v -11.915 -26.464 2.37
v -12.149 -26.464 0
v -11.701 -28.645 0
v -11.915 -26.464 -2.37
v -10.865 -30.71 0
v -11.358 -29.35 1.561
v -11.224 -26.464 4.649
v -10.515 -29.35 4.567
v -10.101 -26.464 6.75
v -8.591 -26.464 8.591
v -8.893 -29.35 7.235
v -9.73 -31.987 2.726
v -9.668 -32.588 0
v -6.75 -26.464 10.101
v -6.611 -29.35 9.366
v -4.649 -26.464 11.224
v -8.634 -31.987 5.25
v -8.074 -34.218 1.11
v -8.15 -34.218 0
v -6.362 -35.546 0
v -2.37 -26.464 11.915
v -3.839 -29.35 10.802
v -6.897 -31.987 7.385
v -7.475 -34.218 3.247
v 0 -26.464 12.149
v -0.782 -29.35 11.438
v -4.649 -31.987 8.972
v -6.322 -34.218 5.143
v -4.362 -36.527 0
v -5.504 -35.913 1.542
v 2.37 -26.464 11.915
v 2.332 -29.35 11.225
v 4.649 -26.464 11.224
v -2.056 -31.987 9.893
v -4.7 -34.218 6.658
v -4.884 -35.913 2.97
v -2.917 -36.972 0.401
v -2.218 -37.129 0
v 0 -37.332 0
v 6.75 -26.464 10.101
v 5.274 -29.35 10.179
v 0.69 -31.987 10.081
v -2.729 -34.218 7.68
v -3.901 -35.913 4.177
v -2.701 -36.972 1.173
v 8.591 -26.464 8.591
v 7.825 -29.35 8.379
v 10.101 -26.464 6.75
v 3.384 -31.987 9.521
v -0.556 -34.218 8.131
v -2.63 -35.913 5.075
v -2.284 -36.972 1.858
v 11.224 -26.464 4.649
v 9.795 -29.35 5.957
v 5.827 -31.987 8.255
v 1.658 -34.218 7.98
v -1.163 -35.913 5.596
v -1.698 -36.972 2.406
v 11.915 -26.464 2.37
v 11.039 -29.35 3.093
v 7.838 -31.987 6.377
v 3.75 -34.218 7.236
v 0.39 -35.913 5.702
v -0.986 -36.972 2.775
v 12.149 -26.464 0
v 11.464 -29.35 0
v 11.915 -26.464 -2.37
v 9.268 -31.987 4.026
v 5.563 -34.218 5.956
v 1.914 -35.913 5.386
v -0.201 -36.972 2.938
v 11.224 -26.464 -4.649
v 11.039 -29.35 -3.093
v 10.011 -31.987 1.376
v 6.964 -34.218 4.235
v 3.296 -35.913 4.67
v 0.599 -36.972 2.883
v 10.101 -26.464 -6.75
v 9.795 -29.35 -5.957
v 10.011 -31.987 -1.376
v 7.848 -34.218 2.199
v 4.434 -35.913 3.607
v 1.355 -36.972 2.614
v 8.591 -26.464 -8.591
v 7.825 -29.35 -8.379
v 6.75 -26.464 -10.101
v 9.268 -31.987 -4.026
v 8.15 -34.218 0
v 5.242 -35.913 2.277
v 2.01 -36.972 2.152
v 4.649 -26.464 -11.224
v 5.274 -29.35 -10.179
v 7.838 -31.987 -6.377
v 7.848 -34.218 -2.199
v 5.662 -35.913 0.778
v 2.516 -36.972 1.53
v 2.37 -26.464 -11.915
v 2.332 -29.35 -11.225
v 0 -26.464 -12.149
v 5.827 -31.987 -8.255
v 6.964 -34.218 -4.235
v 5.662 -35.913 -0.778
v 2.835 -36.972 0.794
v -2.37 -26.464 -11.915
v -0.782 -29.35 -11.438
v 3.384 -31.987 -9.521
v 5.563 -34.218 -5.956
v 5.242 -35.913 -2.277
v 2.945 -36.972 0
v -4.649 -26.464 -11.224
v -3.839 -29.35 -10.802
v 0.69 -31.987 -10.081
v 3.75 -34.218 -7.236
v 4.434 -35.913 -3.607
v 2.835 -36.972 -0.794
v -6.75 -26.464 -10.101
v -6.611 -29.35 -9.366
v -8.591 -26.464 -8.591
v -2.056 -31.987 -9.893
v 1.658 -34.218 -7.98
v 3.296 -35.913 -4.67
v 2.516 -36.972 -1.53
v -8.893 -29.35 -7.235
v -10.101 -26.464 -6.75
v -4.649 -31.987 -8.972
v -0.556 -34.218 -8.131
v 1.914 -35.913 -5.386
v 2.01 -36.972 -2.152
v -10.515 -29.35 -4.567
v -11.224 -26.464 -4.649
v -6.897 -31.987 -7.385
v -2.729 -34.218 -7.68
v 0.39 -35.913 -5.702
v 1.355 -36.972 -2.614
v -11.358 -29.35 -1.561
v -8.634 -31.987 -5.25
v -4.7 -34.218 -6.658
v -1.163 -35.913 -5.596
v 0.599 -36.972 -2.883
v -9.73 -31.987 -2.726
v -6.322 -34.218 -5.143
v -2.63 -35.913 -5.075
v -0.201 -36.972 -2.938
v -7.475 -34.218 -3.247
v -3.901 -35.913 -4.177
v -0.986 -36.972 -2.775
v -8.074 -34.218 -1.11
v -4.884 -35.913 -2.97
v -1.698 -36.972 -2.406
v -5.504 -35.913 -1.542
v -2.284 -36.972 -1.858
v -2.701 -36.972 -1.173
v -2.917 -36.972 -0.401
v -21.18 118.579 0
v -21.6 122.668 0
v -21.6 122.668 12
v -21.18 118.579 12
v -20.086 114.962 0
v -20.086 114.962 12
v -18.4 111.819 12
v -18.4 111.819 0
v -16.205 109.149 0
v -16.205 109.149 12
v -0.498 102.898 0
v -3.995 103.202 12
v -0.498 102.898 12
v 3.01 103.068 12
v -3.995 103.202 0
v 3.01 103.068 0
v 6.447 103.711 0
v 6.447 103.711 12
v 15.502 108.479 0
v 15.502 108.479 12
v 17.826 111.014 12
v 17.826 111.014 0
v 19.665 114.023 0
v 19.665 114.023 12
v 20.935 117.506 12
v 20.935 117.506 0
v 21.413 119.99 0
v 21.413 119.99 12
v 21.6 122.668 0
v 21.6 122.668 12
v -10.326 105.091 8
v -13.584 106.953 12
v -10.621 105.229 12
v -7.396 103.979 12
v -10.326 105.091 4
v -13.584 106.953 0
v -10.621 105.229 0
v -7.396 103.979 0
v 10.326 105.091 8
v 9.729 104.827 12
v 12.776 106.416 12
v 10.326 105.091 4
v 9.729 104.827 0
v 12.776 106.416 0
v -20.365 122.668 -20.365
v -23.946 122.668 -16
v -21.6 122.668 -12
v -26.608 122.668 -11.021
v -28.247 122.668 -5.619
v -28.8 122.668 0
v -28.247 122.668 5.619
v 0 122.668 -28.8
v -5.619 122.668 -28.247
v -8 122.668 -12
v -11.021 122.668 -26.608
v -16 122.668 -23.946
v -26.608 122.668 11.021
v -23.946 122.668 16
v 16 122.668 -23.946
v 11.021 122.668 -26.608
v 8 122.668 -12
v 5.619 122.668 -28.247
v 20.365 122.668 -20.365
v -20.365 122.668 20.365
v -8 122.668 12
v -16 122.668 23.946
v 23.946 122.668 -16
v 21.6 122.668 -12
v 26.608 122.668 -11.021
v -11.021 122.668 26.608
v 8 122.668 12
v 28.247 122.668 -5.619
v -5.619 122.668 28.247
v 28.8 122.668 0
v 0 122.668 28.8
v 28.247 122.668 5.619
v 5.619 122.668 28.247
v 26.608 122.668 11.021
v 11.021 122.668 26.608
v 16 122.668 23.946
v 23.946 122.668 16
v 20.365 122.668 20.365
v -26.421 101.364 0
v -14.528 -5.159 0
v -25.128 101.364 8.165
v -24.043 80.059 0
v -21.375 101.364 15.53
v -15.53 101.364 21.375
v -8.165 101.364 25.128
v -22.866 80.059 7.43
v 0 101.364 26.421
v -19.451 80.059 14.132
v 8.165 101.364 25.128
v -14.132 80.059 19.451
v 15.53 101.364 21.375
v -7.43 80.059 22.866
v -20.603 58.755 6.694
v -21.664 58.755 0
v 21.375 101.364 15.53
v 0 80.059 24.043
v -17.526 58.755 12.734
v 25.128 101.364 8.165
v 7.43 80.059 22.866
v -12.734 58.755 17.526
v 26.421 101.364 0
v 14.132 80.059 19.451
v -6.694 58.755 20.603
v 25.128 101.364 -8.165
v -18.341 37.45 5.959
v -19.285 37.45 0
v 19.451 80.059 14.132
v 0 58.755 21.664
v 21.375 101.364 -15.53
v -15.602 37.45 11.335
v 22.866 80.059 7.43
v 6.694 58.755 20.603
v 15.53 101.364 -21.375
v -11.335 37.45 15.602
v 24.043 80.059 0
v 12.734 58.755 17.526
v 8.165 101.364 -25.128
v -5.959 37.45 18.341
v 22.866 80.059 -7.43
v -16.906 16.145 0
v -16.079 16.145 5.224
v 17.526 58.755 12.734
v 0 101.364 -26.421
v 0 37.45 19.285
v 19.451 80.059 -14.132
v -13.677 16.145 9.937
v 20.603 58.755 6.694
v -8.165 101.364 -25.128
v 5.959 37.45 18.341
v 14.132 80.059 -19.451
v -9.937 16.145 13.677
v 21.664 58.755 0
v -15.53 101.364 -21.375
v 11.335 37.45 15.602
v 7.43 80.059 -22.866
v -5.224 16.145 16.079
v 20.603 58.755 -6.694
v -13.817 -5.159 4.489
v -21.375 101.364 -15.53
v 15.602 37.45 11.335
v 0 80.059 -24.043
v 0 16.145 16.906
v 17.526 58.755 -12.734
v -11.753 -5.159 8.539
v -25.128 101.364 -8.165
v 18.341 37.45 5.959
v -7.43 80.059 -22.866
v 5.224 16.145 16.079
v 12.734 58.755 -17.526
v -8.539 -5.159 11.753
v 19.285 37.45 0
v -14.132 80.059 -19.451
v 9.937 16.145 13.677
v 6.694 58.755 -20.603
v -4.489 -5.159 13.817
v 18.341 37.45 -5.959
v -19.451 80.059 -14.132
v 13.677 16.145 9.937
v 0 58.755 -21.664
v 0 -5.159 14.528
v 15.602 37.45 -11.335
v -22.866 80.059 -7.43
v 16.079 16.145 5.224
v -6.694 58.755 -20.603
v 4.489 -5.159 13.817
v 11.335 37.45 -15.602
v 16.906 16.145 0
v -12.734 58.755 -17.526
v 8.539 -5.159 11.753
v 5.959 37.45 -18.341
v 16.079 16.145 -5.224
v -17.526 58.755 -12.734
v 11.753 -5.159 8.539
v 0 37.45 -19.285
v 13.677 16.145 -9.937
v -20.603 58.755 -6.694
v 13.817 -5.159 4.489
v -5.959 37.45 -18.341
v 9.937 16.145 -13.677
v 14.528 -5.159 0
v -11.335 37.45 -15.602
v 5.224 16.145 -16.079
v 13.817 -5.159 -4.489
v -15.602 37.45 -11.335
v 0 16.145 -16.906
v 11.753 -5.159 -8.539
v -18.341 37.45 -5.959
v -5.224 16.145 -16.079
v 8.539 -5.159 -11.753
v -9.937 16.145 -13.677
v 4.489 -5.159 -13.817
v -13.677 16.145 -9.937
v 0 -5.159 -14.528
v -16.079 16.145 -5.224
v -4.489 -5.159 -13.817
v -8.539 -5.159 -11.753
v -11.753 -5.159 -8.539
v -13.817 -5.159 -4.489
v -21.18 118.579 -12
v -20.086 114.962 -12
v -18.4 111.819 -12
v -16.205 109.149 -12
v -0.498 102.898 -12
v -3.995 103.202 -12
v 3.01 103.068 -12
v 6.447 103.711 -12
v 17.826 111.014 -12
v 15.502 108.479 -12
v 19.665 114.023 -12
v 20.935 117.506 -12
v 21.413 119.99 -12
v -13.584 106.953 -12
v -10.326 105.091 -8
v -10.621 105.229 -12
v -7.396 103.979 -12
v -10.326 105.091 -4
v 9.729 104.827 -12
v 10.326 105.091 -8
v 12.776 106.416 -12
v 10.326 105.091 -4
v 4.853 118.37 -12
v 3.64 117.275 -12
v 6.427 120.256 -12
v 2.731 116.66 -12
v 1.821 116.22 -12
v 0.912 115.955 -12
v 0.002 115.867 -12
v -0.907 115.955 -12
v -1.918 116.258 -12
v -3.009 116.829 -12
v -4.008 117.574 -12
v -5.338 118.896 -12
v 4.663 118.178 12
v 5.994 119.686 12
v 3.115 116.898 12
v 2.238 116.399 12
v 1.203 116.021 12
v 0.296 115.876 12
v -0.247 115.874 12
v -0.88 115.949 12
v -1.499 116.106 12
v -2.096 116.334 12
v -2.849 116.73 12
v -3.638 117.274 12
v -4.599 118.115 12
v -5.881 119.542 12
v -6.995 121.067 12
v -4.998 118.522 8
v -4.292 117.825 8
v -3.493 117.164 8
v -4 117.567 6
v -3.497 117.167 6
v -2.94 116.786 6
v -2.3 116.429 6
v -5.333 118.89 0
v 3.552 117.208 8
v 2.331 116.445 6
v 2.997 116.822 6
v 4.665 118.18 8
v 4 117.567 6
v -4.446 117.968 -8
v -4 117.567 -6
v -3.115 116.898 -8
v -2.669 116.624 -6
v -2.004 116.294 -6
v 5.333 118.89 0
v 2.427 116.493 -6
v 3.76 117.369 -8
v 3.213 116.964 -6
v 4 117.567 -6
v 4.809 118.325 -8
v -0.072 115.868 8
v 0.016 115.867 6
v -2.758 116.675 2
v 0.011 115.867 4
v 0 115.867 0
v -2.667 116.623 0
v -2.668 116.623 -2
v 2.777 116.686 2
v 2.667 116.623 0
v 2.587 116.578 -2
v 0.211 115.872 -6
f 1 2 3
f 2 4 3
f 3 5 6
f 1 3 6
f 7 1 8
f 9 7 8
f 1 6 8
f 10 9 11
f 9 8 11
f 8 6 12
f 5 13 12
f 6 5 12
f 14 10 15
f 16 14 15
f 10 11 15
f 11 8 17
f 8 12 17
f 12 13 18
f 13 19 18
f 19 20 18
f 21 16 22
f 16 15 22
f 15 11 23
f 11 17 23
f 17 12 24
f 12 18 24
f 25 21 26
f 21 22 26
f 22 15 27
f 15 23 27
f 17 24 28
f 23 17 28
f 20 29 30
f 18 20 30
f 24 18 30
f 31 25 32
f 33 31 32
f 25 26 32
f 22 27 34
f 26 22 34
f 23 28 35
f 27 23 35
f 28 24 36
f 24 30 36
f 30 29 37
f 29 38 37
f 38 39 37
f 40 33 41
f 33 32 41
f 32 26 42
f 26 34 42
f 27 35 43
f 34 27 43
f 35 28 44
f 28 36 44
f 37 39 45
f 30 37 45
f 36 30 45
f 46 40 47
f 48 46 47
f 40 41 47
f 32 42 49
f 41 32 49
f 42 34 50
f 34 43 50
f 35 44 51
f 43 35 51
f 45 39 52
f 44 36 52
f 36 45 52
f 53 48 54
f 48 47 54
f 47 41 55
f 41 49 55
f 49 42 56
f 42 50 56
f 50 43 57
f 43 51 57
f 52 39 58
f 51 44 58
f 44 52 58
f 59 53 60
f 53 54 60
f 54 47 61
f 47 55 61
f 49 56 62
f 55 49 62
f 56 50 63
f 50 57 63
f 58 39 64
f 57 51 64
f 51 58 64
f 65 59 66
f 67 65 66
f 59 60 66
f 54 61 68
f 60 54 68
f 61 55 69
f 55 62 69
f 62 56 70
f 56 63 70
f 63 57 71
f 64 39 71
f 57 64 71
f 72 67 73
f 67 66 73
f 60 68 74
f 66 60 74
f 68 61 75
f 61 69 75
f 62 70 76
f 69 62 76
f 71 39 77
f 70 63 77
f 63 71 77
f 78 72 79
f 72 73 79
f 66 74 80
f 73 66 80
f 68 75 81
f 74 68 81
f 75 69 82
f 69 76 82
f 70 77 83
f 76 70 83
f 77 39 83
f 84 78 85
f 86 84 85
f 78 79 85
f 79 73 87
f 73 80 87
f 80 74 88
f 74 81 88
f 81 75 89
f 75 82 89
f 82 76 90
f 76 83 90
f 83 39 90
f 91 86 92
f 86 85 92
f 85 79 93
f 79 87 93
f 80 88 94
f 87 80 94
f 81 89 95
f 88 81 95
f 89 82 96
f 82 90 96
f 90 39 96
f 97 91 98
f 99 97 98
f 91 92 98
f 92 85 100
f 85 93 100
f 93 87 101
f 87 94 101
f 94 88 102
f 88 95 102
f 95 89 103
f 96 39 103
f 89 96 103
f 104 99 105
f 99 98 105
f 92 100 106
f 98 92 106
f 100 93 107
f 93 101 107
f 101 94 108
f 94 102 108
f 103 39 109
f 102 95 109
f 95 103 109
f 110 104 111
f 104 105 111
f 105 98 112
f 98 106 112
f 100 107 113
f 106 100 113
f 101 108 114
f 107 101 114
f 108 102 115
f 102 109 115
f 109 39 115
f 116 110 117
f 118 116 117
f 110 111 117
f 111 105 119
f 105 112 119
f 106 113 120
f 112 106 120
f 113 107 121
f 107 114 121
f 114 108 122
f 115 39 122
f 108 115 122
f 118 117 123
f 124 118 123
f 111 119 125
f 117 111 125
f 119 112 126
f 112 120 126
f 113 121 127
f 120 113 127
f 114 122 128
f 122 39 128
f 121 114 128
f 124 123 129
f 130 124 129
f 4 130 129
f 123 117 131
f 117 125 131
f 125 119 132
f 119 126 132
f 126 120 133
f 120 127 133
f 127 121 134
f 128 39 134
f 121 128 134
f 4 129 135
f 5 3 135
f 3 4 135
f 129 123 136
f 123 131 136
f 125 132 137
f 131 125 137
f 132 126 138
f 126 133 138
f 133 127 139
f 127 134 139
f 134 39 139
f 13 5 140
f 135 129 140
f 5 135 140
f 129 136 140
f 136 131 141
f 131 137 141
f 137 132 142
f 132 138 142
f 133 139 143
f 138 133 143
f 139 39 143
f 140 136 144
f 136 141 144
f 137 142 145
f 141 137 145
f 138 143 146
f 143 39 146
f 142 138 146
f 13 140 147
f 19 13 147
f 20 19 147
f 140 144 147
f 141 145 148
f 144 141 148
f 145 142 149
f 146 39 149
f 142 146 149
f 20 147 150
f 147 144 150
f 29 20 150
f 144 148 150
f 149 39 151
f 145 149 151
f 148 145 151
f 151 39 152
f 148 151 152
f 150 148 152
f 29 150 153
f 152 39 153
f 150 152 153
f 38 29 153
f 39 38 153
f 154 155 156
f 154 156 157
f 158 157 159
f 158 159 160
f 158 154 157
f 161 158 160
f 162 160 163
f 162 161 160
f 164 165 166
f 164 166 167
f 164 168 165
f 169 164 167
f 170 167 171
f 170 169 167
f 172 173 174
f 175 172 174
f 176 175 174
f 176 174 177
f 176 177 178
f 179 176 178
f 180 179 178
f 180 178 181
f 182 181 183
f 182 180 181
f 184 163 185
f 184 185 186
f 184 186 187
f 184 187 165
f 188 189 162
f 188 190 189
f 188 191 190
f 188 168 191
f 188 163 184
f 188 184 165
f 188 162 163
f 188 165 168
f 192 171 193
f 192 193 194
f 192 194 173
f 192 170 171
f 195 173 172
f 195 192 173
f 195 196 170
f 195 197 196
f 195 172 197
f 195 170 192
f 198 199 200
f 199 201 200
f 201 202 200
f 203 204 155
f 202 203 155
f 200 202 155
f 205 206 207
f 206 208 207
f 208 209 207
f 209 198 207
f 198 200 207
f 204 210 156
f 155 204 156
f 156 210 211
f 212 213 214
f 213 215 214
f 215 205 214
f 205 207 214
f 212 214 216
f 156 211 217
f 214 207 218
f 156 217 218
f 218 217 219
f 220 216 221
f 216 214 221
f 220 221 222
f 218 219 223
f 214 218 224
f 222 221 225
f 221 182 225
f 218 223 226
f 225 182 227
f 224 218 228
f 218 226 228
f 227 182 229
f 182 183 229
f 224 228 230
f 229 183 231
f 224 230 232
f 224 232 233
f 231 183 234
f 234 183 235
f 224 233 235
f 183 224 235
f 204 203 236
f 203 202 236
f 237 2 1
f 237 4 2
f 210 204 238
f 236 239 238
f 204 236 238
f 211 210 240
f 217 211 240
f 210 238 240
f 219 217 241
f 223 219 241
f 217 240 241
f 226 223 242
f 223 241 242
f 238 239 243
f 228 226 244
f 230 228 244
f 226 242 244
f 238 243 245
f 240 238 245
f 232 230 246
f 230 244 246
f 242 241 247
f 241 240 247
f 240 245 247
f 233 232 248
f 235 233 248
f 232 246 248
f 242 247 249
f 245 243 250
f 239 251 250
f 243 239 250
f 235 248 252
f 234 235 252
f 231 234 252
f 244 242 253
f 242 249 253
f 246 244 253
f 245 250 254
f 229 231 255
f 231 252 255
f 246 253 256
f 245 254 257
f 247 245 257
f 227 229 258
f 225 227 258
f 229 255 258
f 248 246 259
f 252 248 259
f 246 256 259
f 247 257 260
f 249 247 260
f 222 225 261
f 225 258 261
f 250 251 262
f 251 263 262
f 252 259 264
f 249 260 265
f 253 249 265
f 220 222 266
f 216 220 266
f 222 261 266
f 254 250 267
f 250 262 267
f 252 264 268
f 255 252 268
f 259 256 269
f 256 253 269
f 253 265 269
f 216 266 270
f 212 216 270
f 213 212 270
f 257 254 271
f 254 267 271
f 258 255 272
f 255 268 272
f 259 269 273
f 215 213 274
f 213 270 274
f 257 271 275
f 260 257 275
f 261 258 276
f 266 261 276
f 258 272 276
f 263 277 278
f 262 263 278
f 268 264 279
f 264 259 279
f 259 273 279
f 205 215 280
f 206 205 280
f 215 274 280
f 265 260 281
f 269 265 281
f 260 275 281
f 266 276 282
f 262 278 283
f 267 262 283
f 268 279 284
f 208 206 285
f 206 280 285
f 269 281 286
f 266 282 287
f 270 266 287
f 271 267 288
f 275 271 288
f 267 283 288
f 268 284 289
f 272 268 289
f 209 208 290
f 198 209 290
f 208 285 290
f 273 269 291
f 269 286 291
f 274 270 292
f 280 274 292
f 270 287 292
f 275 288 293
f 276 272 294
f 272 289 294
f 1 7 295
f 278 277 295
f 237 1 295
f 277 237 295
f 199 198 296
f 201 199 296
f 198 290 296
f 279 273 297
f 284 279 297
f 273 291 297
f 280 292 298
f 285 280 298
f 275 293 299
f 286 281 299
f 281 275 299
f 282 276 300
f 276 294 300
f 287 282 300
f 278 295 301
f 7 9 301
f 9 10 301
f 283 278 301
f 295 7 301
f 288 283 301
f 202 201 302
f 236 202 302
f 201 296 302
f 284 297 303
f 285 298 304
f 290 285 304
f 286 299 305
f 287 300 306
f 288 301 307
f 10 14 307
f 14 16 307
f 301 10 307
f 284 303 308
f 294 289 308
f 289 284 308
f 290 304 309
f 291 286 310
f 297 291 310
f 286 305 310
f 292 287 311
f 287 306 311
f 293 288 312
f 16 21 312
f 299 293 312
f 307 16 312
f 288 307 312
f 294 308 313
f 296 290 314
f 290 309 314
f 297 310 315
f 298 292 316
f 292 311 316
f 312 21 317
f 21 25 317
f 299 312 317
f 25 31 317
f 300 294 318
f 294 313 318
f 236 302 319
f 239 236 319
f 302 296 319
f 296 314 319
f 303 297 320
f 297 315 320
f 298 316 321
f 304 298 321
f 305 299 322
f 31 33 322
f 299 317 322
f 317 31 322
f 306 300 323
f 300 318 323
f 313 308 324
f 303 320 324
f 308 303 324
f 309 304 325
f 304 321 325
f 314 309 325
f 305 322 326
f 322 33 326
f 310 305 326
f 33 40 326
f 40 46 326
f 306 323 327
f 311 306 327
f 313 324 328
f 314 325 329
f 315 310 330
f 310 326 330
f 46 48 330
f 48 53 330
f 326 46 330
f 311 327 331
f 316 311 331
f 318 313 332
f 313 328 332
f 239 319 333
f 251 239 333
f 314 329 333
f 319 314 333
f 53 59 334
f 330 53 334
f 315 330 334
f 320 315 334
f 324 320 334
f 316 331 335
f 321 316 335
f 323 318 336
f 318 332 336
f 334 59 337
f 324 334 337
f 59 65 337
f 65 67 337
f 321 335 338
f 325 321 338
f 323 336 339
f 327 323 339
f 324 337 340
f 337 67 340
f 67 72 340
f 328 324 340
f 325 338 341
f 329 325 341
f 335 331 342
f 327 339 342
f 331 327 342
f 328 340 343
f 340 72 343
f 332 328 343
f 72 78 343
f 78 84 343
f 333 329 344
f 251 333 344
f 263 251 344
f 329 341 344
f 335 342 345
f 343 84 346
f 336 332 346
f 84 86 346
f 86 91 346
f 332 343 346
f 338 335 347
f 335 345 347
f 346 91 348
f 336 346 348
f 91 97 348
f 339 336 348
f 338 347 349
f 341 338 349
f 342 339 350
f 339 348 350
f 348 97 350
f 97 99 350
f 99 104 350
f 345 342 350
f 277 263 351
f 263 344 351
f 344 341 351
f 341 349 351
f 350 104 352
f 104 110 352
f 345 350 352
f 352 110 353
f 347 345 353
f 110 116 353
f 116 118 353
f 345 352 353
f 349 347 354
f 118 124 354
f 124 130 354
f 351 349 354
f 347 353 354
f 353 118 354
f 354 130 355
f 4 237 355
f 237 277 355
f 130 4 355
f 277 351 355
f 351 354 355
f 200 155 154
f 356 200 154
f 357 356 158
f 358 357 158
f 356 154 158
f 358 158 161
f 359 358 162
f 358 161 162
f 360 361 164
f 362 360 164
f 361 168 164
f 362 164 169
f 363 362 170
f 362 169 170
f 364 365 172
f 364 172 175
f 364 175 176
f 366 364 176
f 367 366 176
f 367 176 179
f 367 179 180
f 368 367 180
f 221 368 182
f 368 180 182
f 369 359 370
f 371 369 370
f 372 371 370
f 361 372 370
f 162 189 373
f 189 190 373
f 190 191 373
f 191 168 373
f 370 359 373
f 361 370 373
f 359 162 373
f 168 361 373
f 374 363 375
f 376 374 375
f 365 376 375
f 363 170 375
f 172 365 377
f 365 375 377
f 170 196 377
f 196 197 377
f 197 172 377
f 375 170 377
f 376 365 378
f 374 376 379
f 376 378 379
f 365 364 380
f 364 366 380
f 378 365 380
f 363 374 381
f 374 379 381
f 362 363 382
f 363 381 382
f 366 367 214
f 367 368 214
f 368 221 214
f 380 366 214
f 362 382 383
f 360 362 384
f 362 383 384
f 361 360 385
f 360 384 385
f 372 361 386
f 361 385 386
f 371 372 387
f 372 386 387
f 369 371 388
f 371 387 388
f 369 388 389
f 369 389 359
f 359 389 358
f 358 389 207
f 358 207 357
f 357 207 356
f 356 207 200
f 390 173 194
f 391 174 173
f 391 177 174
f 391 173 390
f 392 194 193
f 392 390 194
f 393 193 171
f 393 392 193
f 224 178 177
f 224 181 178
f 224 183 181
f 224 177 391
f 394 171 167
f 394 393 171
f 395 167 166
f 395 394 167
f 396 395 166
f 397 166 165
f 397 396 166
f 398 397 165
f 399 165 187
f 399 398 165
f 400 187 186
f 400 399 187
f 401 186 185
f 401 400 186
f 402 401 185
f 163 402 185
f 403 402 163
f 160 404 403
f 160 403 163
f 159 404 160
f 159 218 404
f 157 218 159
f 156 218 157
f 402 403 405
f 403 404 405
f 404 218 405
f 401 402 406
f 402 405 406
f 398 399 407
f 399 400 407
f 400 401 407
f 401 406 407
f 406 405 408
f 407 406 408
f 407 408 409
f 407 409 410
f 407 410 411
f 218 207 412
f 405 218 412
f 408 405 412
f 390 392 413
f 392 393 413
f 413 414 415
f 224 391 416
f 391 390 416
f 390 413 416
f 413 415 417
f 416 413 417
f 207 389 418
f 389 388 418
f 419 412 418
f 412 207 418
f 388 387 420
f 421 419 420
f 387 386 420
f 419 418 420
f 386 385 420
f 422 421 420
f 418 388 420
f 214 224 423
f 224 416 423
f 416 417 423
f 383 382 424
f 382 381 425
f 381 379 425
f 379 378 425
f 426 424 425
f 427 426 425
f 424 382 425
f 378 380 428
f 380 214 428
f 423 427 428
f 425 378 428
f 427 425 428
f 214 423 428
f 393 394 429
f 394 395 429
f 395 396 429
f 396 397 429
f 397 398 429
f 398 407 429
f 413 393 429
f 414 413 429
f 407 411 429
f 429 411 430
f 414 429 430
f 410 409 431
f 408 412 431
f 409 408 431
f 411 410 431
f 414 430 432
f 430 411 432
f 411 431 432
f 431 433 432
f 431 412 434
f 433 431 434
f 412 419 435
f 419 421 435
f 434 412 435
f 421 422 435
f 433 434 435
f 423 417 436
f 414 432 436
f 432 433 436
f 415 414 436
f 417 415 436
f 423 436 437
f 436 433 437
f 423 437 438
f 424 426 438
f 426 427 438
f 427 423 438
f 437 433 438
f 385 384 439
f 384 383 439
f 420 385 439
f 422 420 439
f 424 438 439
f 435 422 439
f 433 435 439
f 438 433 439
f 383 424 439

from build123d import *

# Parameters (mm, degrees)
ENL_V_MAT_EXTRU_1_DEPTH      = 7.5
ENL_V_MAT_EXTRU_1_DEPTH_BACK = 7.5
BOSS_EXTRU_1_REACH           = 27.5
ECHELLE1_SCALE               = 1.6


with BuildPart() as part:
    # Esquisse1 → R_volution1 (revolve)
    with BuildSketch(Plane.XY):
        with BuildLine():
            Line((0, 0), (0, 100))
            Line((0, 100), (-18, 100))
            Line((-18, 100), (-7.593007693, 6.792401612))
            ThreePointArc((-7.593007693, 6.792401612), (-5.093880777, 1.945904787), (0, 0))
        make_face()
    revolve(axis=Axis((0, 0, 0), (0, 1, 0)))

    # Esquisse2 → Enl_v. mat.-Extru.1 (cut, two sides)
    with BuildSketch(Plane.XY) as enl_v_mat_extru_1_sk:
        with BuildLine():
            Line((-13.5, 100), (13.5, 100))
            add(Edge.make_bspline(
                [(-13.5, 100), (-13.291113541, 83.520875666), (13.291113541, 83.520875666), (13.5, 100)],
                knots=[0, 0, 0, 0, 1, 1, 1, 1], degree=3))
        make_face()
    extrude(amount=ENL_V_MAT_EXTRU_1_DEPTH, mode=Mode.SUBTRACT)
    extrude(enl_v_mat_extru_1_sk.sketch, amount=-ENL_V_MAT_EXTRU_1_DEPTH_BACK, mode=Mode.SUBTRACT)

    # Esquisse3 → Boss.-Extru.1 (add, up to next)
    with BuildSketch(Plane.XY.offset(-7.5), mode=Mode.PRIVATE) as boss_extru_1_sk1:
        with BuildLine():
            Line((-5, 100), (5, 100))
            add(Edge.make_bspline(
                [(-5, 100), (0, 91.498247822), (5, 100)],
                knots=[0, 0, 0, 1, 1, 1], degree=2))
        make_face()
    boss_extru_1_tool1 = extrude(boss_extru_1_sk1.sketch, amount=BOSS_EXTRU_1_REACH, mode=Mode.PRIVATE) - part.part
    add(boss_extru_1_tool1.solids().sort_by_distance((0, 98.29965, -7.5))[0])


with BuildPart() as part_1:
    # Echelle1: scaled about (-4e-09, 62.219241992, 3e-09)
    add(part.part.scale(ECHELLE1_SCALE).moved(Location((2e-09, -37.331545195, -2e-09))))


solid = part_1.part
